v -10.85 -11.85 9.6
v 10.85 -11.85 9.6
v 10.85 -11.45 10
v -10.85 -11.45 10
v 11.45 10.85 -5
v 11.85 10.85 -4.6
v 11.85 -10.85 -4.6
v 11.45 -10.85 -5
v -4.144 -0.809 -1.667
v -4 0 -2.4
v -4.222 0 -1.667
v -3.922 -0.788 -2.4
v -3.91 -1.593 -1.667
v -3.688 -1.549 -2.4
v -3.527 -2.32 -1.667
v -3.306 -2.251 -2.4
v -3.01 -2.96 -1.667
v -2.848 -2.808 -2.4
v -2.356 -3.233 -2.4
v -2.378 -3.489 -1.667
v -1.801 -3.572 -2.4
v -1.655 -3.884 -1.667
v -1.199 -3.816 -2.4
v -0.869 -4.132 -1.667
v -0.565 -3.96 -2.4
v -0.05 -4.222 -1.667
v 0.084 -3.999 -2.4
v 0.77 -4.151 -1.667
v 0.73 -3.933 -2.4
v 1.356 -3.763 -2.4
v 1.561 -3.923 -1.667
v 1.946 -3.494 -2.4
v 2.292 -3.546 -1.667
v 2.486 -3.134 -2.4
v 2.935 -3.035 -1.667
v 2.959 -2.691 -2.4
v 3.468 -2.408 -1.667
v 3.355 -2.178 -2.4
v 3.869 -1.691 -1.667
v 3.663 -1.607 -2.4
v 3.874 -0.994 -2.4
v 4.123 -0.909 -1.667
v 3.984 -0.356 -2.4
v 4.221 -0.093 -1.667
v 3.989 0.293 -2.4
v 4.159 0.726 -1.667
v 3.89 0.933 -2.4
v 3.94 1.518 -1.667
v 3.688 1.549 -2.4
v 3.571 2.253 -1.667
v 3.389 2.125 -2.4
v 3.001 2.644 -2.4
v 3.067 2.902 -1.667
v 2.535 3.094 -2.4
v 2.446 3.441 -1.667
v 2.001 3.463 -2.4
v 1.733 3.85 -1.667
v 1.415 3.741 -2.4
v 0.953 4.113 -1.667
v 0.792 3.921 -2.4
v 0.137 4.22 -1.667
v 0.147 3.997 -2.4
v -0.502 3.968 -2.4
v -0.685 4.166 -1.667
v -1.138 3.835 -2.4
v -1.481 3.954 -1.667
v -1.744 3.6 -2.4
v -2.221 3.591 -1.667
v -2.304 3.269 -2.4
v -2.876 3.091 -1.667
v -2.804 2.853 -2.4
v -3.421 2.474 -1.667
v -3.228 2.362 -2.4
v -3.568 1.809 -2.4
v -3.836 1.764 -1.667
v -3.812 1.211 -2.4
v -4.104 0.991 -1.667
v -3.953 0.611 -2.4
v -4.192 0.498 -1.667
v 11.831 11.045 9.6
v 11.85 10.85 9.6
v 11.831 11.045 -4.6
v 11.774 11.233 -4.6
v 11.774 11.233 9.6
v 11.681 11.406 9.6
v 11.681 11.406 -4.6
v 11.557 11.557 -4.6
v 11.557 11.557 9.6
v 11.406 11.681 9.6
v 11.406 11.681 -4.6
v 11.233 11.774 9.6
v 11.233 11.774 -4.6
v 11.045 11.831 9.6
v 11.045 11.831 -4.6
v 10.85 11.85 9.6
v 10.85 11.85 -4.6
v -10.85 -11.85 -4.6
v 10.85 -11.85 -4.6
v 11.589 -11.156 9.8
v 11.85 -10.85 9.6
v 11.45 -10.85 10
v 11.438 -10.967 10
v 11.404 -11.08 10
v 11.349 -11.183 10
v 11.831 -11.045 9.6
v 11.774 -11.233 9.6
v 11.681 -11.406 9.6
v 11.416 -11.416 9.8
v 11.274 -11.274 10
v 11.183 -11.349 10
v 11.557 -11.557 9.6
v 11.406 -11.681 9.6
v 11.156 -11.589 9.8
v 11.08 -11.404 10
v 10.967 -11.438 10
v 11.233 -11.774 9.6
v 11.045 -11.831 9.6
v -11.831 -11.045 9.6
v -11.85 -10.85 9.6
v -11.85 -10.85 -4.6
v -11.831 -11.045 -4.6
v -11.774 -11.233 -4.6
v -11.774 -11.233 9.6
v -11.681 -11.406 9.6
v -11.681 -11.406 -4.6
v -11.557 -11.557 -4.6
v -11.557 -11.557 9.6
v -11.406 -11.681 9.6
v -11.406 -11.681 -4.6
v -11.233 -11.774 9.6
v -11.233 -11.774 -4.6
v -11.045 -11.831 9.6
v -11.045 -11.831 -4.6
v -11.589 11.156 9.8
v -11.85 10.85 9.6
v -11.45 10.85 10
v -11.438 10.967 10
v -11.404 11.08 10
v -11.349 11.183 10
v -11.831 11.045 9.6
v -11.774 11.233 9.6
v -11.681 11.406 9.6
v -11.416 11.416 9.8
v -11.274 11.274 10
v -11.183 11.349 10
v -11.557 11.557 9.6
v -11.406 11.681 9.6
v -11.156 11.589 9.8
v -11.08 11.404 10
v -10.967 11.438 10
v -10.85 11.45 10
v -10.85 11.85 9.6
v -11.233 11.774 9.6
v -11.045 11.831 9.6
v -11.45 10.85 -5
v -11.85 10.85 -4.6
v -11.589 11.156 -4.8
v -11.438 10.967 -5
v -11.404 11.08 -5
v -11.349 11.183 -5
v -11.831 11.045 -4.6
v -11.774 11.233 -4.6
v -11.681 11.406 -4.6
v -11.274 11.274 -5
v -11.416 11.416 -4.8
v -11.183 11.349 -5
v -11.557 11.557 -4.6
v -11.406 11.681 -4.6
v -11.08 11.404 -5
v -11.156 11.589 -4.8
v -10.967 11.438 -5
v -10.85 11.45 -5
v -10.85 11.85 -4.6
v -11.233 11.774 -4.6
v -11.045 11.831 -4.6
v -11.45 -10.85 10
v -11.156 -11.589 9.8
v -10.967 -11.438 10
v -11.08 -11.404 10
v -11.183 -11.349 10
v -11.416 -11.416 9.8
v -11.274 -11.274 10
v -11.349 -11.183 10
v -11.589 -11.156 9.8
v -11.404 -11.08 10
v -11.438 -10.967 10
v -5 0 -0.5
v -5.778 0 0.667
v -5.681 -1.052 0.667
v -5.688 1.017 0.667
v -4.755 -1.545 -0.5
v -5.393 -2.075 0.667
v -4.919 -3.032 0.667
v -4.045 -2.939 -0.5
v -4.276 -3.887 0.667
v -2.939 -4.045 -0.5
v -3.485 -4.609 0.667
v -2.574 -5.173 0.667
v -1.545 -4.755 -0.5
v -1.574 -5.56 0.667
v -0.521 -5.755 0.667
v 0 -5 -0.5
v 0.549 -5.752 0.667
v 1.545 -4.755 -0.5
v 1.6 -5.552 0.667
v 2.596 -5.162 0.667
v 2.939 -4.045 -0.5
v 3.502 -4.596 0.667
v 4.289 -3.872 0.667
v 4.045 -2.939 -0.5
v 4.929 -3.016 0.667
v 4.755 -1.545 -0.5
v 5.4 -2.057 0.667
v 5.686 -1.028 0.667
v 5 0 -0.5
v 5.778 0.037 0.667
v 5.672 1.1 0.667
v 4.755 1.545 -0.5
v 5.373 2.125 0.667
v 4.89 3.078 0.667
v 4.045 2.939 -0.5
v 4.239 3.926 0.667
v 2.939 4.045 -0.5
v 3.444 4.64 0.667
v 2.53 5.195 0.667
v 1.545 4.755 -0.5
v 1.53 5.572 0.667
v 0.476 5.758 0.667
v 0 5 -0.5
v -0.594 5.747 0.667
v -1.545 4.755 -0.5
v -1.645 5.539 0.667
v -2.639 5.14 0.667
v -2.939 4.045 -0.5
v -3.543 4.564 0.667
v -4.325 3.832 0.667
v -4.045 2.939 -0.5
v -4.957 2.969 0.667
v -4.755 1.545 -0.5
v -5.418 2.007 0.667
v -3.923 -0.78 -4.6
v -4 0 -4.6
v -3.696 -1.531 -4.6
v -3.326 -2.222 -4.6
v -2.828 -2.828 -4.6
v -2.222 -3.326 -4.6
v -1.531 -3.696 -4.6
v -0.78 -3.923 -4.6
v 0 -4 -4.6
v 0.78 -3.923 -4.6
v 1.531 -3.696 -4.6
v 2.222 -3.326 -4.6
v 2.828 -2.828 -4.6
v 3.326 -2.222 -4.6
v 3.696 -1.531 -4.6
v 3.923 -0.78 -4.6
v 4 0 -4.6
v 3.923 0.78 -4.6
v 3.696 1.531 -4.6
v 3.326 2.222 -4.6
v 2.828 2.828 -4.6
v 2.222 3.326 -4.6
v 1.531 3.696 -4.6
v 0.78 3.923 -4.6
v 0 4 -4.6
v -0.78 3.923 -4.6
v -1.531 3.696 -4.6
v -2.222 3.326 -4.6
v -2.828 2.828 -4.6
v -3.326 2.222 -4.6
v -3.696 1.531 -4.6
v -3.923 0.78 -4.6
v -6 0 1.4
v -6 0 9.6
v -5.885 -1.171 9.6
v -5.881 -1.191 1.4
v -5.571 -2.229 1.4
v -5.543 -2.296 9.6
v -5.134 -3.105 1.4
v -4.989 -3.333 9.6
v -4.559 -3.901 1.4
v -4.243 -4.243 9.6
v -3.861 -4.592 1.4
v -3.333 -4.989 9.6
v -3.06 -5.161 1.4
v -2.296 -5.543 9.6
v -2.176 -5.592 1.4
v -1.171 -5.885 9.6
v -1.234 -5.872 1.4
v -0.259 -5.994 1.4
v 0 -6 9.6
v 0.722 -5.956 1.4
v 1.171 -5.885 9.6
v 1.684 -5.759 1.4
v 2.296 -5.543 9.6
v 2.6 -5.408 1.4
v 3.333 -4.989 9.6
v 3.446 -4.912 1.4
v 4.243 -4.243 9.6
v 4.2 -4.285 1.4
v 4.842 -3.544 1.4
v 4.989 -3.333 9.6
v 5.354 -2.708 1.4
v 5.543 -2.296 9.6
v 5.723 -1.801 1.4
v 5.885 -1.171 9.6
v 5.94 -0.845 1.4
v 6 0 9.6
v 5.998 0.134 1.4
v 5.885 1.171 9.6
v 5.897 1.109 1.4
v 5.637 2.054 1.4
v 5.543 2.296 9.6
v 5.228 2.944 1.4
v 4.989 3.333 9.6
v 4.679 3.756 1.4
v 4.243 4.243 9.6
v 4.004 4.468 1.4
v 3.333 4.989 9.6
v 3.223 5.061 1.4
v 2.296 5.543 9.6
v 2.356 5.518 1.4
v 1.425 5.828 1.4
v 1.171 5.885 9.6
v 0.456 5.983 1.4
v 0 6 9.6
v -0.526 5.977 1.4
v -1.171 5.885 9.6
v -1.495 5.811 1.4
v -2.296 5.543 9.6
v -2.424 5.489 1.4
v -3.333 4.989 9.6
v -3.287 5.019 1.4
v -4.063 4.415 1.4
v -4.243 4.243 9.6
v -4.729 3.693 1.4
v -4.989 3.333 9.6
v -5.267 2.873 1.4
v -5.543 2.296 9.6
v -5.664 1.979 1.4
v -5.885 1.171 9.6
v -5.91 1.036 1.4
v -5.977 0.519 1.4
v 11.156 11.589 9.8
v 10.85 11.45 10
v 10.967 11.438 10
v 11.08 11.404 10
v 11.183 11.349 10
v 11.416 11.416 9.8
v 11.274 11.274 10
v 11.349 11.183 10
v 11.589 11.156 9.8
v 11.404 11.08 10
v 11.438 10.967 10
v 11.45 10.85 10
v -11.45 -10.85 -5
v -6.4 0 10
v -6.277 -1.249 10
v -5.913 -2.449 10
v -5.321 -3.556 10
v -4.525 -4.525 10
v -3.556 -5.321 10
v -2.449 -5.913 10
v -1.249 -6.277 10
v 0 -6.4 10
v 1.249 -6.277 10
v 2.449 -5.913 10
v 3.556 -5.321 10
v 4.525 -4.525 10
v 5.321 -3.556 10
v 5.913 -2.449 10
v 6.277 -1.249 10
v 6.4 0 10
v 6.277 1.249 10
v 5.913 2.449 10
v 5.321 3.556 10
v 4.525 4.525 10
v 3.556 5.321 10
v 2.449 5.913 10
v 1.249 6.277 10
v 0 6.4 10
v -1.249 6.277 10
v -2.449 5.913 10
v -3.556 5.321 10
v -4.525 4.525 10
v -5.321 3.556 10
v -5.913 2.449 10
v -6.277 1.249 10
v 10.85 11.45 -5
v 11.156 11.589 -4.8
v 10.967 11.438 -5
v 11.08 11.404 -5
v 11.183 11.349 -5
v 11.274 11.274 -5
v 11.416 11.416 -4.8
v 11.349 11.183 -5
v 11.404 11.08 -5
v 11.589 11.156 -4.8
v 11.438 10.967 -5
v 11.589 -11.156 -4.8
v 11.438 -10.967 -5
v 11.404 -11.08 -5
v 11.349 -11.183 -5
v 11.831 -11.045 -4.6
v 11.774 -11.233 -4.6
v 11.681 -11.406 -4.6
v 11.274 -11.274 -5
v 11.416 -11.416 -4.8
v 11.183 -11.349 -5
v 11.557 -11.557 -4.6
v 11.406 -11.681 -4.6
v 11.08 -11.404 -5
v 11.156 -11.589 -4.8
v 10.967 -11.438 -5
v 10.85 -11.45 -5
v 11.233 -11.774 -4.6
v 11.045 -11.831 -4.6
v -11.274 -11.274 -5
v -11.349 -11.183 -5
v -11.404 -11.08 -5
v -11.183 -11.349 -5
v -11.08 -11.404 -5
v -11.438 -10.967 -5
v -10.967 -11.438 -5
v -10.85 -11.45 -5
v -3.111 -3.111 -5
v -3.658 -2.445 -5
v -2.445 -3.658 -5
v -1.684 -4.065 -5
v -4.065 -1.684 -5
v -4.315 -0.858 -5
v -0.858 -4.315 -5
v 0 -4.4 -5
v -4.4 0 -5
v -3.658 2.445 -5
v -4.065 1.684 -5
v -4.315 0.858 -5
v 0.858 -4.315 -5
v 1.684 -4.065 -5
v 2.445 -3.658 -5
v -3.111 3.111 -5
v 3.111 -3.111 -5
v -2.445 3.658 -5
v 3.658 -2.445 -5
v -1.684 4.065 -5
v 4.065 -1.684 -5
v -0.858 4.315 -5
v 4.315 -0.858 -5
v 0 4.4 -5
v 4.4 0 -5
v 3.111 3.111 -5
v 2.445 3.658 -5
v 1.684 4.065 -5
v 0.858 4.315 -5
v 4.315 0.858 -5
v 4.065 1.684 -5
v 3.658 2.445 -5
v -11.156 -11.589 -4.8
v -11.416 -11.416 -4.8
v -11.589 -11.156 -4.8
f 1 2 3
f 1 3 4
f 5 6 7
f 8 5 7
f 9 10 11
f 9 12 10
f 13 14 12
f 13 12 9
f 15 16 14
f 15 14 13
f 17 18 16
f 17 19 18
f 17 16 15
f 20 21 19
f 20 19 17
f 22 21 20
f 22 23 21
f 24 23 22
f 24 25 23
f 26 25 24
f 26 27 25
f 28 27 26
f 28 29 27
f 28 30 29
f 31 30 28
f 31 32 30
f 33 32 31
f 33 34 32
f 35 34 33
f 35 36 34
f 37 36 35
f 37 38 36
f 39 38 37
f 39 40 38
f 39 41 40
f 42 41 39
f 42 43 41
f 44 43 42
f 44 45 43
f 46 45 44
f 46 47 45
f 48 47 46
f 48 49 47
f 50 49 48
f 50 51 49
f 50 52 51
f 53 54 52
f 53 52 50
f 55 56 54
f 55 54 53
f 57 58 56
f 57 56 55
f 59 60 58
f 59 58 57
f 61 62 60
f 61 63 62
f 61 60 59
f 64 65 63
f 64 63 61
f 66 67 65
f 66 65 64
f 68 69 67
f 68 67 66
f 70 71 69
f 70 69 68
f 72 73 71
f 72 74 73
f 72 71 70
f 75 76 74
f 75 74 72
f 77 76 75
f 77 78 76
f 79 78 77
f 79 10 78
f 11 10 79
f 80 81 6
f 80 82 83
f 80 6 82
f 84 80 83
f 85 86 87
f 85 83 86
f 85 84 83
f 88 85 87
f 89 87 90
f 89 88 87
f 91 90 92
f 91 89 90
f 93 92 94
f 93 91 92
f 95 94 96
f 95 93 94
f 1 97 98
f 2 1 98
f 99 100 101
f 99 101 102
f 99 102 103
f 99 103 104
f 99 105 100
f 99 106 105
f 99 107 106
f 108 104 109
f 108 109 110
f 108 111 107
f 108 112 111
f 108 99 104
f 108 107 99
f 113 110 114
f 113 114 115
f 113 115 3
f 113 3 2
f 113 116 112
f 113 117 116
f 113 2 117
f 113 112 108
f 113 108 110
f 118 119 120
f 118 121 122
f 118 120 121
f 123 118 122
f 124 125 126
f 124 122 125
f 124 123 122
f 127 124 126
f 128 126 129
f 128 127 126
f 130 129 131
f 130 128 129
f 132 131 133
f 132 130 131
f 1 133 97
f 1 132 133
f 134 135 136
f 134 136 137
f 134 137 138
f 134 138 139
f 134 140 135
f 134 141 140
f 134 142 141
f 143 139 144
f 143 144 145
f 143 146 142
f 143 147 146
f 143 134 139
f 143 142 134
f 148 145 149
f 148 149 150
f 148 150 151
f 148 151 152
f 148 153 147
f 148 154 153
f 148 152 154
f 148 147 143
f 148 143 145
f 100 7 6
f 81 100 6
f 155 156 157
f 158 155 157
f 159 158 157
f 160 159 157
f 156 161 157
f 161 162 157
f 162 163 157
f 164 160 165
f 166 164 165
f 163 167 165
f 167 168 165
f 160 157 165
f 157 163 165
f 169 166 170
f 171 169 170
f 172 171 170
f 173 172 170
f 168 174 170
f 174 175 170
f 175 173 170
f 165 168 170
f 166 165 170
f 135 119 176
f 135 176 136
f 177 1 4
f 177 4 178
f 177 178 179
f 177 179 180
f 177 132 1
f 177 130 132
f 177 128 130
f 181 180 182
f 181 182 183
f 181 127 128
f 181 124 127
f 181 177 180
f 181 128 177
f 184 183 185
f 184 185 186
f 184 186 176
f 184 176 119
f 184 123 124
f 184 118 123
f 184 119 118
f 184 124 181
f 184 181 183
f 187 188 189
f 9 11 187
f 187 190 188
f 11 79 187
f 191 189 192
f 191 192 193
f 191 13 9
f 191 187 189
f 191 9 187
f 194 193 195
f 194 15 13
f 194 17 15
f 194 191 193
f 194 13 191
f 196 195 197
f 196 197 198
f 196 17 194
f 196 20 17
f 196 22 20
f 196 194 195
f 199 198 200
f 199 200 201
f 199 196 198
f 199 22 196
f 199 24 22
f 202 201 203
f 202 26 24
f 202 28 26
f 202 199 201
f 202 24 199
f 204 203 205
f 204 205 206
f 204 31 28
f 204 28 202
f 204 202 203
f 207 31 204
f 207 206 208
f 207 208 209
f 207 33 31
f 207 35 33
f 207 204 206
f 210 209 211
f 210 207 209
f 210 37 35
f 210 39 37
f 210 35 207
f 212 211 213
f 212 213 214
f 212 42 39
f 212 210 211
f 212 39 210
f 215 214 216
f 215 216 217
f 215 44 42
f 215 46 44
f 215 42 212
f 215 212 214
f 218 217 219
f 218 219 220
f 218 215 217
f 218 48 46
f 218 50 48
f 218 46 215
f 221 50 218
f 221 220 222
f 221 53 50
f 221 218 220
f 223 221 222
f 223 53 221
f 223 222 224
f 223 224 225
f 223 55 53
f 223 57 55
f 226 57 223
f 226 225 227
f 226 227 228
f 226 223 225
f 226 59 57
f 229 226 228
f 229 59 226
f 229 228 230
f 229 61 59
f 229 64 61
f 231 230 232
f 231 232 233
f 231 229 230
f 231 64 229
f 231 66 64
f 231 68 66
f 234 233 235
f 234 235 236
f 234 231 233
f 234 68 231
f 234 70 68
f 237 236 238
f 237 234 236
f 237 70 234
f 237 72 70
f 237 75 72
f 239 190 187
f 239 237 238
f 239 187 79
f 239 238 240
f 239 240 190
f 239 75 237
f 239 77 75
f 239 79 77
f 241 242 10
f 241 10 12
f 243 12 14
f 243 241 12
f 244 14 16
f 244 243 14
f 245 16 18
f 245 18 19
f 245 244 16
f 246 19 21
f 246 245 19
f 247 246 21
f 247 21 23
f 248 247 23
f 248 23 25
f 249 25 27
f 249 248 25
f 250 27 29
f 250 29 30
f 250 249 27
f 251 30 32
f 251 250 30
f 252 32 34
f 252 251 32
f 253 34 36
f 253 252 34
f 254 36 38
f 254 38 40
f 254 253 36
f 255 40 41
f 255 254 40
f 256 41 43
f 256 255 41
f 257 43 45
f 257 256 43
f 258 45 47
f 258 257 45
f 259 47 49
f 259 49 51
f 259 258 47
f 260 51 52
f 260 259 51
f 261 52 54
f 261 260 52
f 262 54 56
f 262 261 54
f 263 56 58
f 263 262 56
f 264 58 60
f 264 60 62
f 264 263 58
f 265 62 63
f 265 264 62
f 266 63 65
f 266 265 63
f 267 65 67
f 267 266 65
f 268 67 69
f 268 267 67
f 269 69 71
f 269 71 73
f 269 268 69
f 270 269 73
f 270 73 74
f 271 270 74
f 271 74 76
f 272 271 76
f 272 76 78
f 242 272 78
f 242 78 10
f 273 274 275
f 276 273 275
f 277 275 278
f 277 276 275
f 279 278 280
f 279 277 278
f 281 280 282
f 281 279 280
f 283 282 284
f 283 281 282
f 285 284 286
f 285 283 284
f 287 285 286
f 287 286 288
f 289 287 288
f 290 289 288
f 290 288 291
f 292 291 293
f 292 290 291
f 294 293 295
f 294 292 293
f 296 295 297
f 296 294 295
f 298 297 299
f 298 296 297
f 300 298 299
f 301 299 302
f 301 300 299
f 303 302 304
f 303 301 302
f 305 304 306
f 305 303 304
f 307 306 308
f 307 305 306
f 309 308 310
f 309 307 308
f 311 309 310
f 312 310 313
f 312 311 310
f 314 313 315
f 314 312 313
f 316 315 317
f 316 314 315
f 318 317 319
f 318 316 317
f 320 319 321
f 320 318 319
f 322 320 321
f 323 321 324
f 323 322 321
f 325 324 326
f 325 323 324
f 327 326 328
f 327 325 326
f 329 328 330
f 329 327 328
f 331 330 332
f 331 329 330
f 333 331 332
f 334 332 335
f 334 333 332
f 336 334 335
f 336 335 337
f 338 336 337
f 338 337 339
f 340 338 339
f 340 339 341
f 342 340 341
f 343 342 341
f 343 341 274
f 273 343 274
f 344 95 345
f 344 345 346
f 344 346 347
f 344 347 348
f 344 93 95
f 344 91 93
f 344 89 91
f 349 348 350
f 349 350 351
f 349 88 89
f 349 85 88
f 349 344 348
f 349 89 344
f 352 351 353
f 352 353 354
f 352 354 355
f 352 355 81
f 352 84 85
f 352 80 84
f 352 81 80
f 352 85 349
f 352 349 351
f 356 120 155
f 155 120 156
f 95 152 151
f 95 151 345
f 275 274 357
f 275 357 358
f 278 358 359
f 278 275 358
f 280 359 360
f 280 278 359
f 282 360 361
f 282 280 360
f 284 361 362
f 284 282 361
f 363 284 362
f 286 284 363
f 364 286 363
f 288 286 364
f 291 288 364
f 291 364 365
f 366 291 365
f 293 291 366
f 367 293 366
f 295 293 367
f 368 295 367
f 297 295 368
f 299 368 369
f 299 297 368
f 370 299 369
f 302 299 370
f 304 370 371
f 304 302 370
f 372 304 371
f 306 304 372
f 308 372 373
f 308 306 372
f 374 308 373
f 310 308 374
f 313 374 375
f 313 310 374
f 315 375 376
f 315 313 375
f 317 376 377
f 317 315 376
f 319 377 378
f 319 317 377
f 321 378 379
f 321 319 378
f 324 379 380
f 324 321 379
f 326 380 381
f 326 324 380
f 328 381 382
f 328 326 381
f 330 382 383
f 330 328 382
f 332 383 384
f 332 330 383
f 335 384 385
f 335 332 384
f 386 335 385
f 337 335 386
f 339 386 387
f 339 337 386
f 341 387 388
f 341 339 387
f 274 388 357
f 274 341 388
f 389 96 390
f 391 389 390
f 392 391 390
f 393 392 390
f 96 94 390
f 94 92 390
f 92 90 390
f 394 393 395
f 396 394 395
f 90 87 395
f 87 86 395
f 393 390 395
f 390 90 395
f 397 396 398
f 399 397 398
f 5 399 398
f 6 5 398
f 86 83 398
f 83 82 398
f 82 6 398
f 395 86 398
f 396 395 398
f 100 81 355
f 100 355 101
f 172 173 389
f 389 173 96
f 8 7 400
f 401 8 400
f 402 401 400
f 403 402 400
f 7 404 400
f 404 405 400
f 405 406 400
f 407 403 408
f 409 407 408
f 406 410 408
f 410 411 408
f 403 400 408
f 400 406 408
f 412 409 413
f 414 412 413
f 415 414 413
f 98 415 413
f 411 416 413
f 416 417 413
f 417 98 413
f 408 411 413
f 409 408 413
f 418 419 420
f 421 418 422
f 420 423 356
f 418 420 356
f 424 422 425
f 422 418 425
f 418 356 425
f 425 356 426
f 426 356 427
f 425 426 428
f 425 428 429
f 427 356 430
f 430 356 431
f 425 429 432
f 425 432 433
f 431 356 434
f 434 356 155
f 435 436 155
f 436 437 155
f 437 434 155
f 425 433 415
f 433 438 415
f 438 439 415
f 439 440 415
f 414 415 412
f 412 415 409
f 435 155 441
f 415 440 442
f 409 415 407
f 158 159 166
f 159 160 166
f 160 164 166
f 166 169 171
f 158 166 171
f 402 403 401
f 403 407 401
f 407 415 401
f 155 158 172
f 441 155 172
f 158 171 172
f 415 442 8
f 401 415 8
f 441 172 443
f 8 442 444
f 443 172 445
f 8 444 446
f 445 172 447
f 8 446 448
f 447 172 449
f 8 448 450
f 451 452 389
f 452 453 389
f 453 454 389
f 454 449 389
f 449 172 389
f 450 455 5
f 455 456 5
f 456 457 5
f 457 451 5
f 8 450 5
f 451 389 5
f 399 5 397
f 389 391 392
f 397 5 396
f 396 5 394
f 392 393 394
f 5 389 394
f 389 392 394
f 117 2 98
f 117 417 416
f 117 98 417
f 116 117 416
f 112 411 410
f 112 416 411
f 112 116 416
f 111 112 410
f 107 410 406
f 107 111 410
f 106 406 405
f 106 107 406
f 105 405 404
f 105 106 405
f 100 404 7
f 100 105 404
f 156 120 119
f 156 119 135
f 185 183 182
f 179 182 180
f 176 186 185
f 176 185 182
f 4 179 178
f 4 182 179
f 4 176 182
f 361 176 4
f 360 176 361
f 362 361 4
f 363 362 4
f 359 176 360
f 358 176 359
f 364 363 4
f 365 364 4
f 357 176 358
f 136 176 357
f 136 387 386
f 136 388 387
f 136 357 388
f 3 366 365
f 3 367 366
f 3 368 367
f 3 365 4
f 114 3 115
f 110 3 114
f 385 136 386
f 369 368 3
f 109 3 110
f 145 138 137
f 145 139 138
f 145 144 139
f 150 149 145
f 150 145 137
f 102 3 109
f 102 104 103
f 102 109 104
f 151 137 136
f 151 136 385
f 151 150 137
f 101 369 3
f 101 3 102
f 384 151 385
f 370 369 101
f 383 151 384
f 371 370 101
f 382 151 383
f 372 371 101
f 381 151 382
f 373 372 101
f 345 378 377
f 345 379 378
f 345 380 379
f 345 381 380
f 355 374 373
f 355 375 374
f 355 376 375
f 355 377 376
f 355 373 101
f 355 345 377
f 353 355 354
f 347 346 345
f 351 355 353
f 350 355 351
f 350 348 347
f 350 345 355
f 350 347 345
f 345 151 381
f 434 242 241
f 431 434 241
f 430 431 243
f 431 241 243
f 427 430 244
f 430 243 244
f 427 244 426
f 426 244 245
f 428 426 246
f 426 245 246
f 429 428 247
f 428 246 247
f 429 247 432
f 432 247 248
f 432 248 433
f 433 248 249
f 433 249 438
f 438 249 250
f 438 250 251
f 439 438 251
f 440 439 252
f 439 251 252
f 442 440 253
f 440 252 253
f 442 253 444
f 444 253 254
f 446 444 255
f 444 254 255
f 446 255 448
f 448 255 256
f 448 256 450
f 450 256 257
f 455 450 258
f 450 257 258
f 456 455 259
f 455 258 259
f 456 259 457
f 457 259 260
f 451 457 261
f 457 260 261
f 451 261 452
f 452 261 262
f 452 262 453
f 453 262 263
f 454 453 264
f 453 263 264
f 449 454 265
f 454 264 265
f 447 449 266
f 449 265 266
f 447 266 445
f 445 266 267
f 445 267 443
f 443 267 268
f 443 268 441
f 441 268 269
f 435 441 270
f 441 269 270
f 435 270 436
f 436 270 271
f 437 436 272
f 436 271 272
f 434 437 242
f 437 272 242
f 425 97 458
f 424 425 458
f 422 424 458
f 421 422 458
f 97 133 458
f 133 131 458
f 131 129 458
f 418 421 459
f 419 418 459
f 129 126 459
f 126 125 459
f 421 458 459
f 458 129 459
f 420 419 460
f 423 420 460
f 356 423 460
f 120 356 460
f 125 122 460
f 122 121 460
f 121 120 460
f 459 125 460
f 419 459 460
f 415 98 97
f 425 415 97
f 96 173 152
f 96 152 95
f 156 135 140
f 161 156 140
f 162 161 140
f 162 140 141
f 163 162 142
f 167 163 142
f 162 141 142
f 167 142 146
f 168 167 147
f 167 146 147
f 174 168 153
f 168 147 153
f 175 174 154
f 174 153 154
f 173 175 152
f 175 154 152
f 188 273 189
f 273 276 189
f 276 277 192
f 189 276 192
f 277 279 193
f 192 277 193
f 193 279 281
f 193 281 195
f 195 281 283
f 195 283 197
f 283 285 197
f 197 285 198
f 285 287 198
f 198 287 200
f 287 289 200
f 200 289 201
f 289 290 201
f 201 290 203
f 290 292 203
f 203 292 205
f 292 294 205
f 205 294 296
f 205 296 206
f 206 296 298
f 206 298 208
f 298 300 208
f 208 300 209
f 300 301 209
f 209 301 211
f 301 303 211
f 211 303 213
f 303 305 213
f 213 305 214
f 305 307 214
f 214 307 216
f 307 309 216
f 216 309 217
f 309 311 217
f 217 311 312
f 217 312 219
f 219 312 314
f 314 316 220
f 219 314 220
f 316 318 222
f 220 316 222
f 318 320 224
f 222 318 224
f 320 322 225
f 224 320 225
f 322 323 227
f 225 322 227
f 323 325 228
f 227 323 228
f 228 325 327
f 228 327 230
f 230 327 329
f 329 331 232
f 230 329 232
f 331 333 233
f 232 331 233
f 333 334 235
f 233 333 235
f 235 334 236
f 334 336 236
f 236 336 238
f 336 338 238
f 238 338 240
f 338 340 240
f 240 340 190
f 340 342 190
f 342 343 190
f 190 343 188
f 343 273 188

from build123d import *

# Parameters (mm, degrees)
SKETCH_W           = 23.7
SKETCH_H           = 23.7
PAD_DEPTH          = 15
FILLET003_R        = 1
CHAMFER002007_SIZE = 0.4


with BuildPart() as part:
    # Sketch → Pad (new body)
    with BuildSketch(Plane.XY):
        Rectangle(SKETCH_W, SKETCH_H)
    extrude(amount=PAD_DEPTH)

    # Fillet003
    fillet003_edges = [part.edges().sort_by_distance(p)[0] for p in [
        (-11.85, 11.85, 7.5),
        (-11.85, -11.85, 7.5),
        (11.85, 11.85, 7.5),
        (11.85, -11.85, 7.5),
    ]]
    fillet(fillet003_edges, radius=FILLET003_R)

    # Sketch001 → Groove (revolve, cut)
    with BuildSketch(Plane.XZ):
        Polygon((0, 0), (0, 15), (-6, 15), (-6, 6), (-4, 3), (-4, 0), align=None)
    revolve(axis=Axis((0, 0, 0), (0, 0, 1)), mode=Mode.SUBTRACT)

    # Chamfer002007
    chamfer002007_edges = [part.edges().sort_by_distance(p)[0] for p in [
        (0, 11.85, 15),
        (-11.557107, 11.557107, 15),
        (11.557107, 11.557107, 15),
        (-11.85, 0, 15),
        (11.85, 0, 15),
        (-11.557107, -11.557107, 15),
        (11.557107, -11.557107, 15),
        (0, -11.85, 15),
        (6, 0, 15),
        (0, 11.85, 0),
        (-11.557107, 11.557107, 0),
        (11.557107, 11.557107, 0),
        (-11.85, 0, 0),
        (11.85, 0, 0),
        (-11.557107, -11.557107, 0),
        (11.557107, -11.557107, 0),
        (0, -11.85, 0),
        (4, 0, 0),
        (4, 0, 3),
        (6, 0, 6),
    ]]
    chamfer(chamfer002007_edges, length=CHAMFER002007_SIZE)


with BuildPart() as part_1:
    # Body placement: moved
    add(part.part.moved(Location((0, 0, -5))))


solid = part_1.part
